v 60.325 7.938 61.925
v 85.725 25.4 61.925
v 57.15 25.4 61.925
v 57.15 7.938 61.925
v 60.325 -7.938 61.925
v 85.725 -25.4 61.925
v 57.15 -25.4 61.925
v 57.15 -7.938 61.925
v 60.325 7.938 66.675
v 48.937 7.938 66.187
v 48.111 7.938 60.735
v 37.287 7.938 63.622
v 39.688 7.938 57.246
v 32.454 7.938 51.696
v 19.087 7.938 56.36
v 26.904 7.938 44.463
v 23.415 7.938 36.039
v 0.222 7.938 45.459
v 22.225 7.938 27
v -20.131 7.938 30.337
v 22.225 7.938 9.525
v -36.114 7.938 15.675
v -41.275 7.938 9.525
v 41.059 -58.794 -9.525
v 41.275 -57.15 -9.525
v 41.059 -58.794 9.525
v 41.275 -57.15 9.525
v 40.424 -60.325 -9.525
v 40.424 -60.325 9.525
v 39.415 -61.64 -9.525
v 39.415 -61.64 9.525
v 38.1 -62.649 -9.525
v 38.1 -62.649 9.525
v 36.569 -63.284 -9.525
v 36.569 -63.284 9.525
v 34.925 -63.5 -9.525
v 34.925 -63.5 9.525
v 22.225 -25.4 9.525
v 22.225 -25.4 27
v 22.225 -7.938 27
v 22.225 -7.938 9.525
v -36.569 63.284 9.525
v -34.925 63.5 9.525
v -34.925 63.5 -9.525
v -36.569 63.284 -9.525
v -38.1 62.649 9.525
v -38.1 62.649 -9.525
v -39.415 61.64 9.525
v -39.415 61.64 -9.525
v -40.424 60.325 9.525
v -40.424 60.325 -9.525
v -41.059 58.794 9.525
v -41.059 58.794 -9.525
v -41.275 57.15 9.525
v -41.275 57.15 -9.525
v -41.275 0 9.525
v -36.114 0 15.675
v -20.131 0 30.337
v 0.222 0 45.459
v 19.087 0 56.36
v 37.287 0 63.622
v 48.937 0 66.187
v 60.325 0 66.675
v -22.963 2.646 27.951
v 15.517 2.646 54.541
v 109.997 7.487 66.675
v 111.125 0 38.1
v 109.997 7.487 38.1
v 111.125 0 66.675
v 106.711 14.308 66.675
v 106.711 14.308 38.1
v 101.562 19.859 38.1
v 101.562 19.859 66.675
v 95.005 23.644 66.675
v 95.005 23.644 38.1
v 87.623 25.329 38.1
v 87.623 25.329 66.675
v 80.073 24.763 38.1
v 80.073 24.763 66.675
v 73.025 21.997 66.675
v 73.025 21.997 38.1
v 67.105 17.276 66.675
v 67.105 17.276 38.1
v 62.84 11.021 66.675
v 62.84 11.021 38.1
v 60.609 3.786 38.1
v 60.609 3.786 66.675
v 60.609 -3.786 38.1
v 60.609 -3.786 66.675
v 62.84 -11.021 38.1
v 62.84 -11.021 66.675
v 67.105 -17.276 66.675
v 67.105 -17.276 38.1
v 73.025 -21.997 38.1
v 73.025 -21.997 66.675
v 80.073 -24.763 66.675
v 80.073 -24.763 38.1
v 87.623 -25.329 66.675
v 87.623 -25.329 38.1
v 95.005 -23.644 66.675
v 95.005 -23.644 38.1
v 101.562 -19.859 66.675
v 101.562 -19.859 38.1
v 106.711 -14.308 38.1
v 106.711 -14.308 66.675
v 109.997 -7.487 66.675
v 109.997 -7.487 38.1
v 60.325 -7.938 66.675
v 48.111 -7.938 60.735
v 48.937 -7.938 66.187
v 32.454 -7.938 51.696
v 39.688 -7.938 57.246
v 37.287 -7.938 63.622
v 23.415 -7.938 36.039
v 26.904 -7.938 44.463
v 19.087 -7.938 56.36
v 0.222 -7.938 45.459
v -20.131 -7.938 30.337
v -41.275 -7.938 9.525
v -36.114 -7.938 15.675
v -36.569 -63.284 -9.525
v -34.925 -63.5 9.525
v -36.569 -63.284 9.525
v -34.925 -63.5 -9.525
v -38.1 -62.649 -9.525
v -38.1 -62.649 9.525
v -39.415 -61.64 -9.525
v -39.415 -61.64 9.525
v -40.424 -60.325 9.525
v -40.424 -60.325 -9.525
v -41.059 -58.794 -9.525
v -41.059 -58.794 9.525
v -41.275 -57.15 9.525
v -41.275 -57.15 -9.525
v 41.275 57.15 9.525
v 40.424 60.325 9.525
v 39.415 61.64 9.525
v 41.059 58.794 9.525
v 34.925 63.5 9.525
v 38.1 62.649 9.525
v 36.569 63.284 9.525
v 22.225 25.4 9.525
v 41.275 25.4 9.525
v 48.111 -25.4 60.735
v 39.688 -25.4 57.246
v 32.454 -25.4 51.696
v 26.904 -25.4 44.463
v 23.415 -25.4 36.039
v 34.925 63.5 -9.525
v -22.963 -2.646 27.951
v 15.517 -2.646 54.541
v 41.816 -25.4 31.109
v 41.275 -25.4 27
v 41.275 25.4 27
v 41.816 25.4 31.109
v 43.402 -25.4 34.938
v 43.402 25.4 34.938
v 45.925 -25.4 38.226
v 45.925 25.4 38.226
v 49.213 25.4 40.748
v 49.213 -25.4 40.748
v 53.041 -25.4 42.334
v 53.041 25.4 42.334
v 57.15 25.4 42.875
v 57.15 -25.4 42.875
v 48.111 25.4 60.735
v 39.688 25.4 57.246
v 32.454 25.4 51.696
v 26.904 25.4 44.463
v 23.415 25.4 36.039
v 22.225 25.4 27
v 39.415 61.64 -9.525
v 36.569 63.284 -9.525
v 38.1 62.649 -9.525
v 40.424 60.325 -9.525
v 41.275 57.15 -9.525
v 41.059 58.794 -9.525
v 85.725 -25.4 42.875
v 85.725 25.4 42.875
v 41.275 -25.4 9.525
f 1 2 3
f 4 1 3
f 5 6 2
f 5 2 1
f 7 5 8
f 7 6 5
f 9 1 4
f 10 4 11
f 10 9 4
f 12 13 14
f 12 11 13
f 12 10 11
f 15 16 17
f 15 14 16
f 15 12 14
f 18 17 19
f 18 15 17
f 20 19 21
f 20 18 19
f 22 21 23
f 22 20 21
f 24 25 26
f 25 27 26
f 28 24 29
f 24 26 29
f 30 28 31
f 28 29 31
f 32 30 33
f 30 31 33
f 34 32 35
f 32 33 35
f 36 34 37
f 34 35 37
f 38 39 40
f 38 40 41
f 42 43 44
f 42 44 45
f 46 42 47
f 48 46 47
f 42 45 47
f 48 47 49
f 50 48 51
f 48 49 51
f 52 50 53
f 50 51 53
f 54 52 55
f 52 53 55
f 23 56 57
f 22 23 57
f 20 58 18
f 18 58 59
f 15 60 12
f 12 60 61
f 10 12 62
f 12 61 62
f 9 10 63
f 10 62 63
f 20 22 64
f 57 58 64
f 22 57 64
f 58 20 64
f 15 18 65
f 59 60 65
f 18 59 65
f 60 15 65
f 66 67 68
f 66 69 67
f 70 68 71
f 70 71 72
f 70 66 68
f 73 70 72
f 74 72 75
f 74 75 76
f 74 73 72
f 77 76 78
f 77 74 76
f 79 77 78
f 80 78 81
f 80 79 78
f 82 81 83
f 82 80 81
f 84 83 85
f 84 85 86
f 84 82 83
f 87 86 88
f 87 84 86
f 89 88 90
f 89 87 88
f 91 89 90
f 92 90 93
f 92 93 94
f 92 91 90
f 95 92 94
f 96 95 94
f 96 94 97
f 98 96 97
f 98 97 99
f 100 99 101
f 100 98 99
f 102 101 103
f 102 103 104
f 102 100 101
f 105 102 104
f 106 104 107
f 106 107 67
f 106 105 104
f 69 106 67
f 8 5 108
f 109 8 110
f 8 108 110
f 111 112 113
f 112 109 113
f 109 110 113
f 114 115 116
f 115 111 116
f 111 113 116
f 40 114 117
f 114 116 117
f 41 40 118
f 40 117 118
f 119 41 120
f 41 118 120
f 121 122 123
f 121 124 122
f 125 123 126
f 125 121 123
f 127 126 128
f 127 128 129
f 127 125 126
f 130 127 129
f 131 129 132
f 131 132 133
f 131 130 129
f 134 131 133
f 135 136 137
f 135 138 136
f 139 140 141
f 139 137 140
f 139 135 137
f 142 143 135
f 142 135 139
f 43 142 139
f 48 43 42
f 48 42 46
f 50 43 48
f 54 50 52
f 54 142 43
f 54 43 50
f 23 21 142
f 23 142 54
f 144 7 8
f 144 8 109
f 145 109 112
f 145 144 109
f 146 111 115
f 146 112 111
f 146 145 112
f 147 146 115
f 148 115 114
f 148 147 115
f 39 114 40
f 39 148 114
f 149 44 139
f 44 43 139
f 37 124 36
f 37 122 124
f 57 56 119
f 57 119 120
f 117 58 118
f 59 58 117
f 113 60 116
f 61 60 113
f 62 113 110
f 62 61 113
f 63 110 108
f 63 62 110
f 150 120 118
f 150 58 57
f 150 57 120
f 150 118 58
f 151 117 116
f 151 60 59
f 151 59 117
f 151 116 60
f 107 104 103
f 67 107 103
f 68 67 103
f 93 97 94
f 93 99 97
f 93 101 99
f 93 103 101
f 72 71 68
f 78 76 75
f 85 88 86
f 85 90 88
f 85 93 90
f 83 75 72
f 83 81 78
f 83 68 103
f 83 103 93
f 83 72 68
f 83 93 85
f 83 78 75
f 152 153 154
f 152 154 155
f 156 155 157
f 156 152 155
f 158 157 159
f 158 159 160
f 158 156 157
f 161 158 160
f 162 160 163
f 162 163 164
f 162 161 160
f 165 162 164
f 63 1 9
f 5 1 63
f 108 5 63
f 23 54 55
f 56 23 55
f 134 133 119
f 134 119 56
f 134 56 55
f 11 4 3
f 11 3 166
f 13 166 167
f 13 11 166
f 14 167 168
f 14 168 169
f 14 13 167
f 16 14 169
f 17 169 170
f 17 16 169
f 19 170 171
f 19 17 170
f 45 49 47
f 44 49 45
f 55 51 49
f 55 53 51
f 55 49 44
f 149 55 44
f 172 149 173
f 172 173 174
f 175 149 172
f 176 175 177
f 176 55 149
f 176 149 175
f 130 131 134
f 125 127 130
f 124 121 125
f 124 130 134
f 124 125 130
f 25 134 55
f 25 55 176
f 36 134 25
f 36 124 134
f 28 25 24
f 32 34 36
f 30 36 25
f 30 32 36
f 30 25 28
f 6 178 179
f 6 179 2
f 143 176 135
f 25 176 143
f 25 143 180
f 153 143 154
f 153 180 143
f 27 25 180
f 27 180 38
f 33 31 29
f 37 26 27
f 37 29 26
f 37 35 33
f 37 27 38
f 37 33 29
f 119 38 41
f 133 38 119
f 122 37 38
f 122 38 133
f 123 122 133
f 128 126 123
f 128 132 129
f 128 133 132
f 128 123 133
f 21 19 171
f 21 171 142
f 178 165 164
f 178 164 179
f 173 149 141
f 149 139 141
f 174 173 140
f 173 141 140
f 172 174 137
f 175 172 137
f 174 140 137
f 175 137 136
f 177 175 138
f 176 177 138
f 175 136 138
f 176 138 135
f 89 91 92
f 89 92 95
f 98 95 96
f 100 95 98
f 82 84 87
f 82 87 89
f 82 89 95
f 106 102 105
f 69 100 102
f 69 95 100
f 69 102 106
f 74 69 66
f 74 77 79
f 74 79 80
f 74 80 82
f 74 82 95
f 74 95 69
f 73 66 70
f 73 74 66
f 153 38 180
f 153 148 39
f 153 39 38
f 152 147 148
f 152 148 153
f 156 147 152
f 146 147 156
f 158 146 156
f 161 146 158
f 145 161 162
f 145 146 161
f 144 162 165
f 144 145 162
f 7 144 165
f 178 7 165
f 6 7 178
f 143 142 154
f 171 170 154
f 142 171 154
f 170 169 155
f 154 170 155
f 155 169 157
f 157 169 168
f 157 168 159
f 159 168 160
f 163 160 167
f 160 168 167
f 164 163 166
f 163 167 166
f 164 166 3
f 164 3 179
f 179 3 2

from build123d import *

# Parameters (mm, degrees)
F1_DEPTH = 63.5
F0_W     = 25.4
F0_H     = 19.05
F2_DEPTH = 25.4
F3_DEPTH = 7.9375
F5_R     = 6.35


with BuildPart() as f1:
    # F0 (on Front) → F1 (new body, symmetric)
    with BuildSketch(Plane.XZ):
        Polygon((-41.275, -9.525), (41.275, -9.525), (41.275, 9.525), (22.225, 9.525), (17.4752, 9.525), (-41.275, 9.525), align=None)
    extrude(amount=F1_DEPTH, both=True)

    # F0 (on Front) → F2 (join, symmetric)
    with BuildSketch(Plane.XZ):
        with BuildLine():
            Line((22.225, 9.525), (41.275, 9.525))
            Line((41.275, 9.525), (41.275, 27.0002))
            ThreePointArc((41.275, 27.0002), (45.9246798487, 38.2255201513), (57.15, 42.8752))
            Line((57.15, 42.8752), (60.325, 42.8752))
            Line((60.325, 42.8752), (60.325, 61.9252))
            Line((60.325, 61.9252), (57.15, 61.9252))
            ThreePointArc((57.15, 61.9252), (32.4542956671, 51.6959043329), (22.225, 27.0002))
            Line((22.225, 27.0002), (22.225, 9.525))
        make_face()
        with Locations((73.025, 52.4002)):
            Rectangle(F0_W, F0_H)
    extrude(amount=F2_DEPTH, both=True)

    # F0 (on Front) → F3 (join, symmetric)
    with BuildSketch(Plane.XZ):
        with BuildLine():
            add(Edge.make_bspline(
                [(-41.275, 9.525), (-37.6614816487, 16.3277760148), (16.9668775052, 69.3094581366), (60.325, 66.675)],
                knots=[0, 0, 0, 0, 116.5705044169, 116.5705044169, 116.5705044169, 116.5705044169], degree=3))
            Line((-41.275, 9.525), (17.4752, 9.525))
            Line((17.4752, 9.525), (22.225, 9.525))
            Line((22.225, 9.525), (22.225, 27.0002))
            ThreePointArc((22.225, 27.0002), (32.4542956671, 51.6959043329), (57.15, 61.9252))
            Line((57.15, 61.9252), (60.325, 61.9252))
            Line((60.325, 61.9252), (60.325, 66.675))
        make_face()
    extrude(amount=F3_DEPTH, both=True)

    # F5
    f5_edges = [f1.edges().sort_by_distance(p)[0] for p in [
        (-41.275, -63.5, 0),
        (41.275, -63.5, 0),
        (-41.275, 63.5, 0),
        (41.275, 63.5, 0),
    ]]
    fillet(f5_edges, radius=F5_R)


with BuildPart() as f4:
    # F0 (on Front) → F4 (revolve)
    with BuildSketch(Plane.XZ):
        Polygon((88.9, 66.675), (85.725, 66.675), (85.725, 61.9252), (85.725, 42.8752), (85.725, 38.1), (111.125, 38.1), (111.125, 66.675), align=None)
    revolve(axis=Axis((85.725, 0, 52.3875), (0, 0, 1)))


solid = Compound([f1.part, f4.part])
